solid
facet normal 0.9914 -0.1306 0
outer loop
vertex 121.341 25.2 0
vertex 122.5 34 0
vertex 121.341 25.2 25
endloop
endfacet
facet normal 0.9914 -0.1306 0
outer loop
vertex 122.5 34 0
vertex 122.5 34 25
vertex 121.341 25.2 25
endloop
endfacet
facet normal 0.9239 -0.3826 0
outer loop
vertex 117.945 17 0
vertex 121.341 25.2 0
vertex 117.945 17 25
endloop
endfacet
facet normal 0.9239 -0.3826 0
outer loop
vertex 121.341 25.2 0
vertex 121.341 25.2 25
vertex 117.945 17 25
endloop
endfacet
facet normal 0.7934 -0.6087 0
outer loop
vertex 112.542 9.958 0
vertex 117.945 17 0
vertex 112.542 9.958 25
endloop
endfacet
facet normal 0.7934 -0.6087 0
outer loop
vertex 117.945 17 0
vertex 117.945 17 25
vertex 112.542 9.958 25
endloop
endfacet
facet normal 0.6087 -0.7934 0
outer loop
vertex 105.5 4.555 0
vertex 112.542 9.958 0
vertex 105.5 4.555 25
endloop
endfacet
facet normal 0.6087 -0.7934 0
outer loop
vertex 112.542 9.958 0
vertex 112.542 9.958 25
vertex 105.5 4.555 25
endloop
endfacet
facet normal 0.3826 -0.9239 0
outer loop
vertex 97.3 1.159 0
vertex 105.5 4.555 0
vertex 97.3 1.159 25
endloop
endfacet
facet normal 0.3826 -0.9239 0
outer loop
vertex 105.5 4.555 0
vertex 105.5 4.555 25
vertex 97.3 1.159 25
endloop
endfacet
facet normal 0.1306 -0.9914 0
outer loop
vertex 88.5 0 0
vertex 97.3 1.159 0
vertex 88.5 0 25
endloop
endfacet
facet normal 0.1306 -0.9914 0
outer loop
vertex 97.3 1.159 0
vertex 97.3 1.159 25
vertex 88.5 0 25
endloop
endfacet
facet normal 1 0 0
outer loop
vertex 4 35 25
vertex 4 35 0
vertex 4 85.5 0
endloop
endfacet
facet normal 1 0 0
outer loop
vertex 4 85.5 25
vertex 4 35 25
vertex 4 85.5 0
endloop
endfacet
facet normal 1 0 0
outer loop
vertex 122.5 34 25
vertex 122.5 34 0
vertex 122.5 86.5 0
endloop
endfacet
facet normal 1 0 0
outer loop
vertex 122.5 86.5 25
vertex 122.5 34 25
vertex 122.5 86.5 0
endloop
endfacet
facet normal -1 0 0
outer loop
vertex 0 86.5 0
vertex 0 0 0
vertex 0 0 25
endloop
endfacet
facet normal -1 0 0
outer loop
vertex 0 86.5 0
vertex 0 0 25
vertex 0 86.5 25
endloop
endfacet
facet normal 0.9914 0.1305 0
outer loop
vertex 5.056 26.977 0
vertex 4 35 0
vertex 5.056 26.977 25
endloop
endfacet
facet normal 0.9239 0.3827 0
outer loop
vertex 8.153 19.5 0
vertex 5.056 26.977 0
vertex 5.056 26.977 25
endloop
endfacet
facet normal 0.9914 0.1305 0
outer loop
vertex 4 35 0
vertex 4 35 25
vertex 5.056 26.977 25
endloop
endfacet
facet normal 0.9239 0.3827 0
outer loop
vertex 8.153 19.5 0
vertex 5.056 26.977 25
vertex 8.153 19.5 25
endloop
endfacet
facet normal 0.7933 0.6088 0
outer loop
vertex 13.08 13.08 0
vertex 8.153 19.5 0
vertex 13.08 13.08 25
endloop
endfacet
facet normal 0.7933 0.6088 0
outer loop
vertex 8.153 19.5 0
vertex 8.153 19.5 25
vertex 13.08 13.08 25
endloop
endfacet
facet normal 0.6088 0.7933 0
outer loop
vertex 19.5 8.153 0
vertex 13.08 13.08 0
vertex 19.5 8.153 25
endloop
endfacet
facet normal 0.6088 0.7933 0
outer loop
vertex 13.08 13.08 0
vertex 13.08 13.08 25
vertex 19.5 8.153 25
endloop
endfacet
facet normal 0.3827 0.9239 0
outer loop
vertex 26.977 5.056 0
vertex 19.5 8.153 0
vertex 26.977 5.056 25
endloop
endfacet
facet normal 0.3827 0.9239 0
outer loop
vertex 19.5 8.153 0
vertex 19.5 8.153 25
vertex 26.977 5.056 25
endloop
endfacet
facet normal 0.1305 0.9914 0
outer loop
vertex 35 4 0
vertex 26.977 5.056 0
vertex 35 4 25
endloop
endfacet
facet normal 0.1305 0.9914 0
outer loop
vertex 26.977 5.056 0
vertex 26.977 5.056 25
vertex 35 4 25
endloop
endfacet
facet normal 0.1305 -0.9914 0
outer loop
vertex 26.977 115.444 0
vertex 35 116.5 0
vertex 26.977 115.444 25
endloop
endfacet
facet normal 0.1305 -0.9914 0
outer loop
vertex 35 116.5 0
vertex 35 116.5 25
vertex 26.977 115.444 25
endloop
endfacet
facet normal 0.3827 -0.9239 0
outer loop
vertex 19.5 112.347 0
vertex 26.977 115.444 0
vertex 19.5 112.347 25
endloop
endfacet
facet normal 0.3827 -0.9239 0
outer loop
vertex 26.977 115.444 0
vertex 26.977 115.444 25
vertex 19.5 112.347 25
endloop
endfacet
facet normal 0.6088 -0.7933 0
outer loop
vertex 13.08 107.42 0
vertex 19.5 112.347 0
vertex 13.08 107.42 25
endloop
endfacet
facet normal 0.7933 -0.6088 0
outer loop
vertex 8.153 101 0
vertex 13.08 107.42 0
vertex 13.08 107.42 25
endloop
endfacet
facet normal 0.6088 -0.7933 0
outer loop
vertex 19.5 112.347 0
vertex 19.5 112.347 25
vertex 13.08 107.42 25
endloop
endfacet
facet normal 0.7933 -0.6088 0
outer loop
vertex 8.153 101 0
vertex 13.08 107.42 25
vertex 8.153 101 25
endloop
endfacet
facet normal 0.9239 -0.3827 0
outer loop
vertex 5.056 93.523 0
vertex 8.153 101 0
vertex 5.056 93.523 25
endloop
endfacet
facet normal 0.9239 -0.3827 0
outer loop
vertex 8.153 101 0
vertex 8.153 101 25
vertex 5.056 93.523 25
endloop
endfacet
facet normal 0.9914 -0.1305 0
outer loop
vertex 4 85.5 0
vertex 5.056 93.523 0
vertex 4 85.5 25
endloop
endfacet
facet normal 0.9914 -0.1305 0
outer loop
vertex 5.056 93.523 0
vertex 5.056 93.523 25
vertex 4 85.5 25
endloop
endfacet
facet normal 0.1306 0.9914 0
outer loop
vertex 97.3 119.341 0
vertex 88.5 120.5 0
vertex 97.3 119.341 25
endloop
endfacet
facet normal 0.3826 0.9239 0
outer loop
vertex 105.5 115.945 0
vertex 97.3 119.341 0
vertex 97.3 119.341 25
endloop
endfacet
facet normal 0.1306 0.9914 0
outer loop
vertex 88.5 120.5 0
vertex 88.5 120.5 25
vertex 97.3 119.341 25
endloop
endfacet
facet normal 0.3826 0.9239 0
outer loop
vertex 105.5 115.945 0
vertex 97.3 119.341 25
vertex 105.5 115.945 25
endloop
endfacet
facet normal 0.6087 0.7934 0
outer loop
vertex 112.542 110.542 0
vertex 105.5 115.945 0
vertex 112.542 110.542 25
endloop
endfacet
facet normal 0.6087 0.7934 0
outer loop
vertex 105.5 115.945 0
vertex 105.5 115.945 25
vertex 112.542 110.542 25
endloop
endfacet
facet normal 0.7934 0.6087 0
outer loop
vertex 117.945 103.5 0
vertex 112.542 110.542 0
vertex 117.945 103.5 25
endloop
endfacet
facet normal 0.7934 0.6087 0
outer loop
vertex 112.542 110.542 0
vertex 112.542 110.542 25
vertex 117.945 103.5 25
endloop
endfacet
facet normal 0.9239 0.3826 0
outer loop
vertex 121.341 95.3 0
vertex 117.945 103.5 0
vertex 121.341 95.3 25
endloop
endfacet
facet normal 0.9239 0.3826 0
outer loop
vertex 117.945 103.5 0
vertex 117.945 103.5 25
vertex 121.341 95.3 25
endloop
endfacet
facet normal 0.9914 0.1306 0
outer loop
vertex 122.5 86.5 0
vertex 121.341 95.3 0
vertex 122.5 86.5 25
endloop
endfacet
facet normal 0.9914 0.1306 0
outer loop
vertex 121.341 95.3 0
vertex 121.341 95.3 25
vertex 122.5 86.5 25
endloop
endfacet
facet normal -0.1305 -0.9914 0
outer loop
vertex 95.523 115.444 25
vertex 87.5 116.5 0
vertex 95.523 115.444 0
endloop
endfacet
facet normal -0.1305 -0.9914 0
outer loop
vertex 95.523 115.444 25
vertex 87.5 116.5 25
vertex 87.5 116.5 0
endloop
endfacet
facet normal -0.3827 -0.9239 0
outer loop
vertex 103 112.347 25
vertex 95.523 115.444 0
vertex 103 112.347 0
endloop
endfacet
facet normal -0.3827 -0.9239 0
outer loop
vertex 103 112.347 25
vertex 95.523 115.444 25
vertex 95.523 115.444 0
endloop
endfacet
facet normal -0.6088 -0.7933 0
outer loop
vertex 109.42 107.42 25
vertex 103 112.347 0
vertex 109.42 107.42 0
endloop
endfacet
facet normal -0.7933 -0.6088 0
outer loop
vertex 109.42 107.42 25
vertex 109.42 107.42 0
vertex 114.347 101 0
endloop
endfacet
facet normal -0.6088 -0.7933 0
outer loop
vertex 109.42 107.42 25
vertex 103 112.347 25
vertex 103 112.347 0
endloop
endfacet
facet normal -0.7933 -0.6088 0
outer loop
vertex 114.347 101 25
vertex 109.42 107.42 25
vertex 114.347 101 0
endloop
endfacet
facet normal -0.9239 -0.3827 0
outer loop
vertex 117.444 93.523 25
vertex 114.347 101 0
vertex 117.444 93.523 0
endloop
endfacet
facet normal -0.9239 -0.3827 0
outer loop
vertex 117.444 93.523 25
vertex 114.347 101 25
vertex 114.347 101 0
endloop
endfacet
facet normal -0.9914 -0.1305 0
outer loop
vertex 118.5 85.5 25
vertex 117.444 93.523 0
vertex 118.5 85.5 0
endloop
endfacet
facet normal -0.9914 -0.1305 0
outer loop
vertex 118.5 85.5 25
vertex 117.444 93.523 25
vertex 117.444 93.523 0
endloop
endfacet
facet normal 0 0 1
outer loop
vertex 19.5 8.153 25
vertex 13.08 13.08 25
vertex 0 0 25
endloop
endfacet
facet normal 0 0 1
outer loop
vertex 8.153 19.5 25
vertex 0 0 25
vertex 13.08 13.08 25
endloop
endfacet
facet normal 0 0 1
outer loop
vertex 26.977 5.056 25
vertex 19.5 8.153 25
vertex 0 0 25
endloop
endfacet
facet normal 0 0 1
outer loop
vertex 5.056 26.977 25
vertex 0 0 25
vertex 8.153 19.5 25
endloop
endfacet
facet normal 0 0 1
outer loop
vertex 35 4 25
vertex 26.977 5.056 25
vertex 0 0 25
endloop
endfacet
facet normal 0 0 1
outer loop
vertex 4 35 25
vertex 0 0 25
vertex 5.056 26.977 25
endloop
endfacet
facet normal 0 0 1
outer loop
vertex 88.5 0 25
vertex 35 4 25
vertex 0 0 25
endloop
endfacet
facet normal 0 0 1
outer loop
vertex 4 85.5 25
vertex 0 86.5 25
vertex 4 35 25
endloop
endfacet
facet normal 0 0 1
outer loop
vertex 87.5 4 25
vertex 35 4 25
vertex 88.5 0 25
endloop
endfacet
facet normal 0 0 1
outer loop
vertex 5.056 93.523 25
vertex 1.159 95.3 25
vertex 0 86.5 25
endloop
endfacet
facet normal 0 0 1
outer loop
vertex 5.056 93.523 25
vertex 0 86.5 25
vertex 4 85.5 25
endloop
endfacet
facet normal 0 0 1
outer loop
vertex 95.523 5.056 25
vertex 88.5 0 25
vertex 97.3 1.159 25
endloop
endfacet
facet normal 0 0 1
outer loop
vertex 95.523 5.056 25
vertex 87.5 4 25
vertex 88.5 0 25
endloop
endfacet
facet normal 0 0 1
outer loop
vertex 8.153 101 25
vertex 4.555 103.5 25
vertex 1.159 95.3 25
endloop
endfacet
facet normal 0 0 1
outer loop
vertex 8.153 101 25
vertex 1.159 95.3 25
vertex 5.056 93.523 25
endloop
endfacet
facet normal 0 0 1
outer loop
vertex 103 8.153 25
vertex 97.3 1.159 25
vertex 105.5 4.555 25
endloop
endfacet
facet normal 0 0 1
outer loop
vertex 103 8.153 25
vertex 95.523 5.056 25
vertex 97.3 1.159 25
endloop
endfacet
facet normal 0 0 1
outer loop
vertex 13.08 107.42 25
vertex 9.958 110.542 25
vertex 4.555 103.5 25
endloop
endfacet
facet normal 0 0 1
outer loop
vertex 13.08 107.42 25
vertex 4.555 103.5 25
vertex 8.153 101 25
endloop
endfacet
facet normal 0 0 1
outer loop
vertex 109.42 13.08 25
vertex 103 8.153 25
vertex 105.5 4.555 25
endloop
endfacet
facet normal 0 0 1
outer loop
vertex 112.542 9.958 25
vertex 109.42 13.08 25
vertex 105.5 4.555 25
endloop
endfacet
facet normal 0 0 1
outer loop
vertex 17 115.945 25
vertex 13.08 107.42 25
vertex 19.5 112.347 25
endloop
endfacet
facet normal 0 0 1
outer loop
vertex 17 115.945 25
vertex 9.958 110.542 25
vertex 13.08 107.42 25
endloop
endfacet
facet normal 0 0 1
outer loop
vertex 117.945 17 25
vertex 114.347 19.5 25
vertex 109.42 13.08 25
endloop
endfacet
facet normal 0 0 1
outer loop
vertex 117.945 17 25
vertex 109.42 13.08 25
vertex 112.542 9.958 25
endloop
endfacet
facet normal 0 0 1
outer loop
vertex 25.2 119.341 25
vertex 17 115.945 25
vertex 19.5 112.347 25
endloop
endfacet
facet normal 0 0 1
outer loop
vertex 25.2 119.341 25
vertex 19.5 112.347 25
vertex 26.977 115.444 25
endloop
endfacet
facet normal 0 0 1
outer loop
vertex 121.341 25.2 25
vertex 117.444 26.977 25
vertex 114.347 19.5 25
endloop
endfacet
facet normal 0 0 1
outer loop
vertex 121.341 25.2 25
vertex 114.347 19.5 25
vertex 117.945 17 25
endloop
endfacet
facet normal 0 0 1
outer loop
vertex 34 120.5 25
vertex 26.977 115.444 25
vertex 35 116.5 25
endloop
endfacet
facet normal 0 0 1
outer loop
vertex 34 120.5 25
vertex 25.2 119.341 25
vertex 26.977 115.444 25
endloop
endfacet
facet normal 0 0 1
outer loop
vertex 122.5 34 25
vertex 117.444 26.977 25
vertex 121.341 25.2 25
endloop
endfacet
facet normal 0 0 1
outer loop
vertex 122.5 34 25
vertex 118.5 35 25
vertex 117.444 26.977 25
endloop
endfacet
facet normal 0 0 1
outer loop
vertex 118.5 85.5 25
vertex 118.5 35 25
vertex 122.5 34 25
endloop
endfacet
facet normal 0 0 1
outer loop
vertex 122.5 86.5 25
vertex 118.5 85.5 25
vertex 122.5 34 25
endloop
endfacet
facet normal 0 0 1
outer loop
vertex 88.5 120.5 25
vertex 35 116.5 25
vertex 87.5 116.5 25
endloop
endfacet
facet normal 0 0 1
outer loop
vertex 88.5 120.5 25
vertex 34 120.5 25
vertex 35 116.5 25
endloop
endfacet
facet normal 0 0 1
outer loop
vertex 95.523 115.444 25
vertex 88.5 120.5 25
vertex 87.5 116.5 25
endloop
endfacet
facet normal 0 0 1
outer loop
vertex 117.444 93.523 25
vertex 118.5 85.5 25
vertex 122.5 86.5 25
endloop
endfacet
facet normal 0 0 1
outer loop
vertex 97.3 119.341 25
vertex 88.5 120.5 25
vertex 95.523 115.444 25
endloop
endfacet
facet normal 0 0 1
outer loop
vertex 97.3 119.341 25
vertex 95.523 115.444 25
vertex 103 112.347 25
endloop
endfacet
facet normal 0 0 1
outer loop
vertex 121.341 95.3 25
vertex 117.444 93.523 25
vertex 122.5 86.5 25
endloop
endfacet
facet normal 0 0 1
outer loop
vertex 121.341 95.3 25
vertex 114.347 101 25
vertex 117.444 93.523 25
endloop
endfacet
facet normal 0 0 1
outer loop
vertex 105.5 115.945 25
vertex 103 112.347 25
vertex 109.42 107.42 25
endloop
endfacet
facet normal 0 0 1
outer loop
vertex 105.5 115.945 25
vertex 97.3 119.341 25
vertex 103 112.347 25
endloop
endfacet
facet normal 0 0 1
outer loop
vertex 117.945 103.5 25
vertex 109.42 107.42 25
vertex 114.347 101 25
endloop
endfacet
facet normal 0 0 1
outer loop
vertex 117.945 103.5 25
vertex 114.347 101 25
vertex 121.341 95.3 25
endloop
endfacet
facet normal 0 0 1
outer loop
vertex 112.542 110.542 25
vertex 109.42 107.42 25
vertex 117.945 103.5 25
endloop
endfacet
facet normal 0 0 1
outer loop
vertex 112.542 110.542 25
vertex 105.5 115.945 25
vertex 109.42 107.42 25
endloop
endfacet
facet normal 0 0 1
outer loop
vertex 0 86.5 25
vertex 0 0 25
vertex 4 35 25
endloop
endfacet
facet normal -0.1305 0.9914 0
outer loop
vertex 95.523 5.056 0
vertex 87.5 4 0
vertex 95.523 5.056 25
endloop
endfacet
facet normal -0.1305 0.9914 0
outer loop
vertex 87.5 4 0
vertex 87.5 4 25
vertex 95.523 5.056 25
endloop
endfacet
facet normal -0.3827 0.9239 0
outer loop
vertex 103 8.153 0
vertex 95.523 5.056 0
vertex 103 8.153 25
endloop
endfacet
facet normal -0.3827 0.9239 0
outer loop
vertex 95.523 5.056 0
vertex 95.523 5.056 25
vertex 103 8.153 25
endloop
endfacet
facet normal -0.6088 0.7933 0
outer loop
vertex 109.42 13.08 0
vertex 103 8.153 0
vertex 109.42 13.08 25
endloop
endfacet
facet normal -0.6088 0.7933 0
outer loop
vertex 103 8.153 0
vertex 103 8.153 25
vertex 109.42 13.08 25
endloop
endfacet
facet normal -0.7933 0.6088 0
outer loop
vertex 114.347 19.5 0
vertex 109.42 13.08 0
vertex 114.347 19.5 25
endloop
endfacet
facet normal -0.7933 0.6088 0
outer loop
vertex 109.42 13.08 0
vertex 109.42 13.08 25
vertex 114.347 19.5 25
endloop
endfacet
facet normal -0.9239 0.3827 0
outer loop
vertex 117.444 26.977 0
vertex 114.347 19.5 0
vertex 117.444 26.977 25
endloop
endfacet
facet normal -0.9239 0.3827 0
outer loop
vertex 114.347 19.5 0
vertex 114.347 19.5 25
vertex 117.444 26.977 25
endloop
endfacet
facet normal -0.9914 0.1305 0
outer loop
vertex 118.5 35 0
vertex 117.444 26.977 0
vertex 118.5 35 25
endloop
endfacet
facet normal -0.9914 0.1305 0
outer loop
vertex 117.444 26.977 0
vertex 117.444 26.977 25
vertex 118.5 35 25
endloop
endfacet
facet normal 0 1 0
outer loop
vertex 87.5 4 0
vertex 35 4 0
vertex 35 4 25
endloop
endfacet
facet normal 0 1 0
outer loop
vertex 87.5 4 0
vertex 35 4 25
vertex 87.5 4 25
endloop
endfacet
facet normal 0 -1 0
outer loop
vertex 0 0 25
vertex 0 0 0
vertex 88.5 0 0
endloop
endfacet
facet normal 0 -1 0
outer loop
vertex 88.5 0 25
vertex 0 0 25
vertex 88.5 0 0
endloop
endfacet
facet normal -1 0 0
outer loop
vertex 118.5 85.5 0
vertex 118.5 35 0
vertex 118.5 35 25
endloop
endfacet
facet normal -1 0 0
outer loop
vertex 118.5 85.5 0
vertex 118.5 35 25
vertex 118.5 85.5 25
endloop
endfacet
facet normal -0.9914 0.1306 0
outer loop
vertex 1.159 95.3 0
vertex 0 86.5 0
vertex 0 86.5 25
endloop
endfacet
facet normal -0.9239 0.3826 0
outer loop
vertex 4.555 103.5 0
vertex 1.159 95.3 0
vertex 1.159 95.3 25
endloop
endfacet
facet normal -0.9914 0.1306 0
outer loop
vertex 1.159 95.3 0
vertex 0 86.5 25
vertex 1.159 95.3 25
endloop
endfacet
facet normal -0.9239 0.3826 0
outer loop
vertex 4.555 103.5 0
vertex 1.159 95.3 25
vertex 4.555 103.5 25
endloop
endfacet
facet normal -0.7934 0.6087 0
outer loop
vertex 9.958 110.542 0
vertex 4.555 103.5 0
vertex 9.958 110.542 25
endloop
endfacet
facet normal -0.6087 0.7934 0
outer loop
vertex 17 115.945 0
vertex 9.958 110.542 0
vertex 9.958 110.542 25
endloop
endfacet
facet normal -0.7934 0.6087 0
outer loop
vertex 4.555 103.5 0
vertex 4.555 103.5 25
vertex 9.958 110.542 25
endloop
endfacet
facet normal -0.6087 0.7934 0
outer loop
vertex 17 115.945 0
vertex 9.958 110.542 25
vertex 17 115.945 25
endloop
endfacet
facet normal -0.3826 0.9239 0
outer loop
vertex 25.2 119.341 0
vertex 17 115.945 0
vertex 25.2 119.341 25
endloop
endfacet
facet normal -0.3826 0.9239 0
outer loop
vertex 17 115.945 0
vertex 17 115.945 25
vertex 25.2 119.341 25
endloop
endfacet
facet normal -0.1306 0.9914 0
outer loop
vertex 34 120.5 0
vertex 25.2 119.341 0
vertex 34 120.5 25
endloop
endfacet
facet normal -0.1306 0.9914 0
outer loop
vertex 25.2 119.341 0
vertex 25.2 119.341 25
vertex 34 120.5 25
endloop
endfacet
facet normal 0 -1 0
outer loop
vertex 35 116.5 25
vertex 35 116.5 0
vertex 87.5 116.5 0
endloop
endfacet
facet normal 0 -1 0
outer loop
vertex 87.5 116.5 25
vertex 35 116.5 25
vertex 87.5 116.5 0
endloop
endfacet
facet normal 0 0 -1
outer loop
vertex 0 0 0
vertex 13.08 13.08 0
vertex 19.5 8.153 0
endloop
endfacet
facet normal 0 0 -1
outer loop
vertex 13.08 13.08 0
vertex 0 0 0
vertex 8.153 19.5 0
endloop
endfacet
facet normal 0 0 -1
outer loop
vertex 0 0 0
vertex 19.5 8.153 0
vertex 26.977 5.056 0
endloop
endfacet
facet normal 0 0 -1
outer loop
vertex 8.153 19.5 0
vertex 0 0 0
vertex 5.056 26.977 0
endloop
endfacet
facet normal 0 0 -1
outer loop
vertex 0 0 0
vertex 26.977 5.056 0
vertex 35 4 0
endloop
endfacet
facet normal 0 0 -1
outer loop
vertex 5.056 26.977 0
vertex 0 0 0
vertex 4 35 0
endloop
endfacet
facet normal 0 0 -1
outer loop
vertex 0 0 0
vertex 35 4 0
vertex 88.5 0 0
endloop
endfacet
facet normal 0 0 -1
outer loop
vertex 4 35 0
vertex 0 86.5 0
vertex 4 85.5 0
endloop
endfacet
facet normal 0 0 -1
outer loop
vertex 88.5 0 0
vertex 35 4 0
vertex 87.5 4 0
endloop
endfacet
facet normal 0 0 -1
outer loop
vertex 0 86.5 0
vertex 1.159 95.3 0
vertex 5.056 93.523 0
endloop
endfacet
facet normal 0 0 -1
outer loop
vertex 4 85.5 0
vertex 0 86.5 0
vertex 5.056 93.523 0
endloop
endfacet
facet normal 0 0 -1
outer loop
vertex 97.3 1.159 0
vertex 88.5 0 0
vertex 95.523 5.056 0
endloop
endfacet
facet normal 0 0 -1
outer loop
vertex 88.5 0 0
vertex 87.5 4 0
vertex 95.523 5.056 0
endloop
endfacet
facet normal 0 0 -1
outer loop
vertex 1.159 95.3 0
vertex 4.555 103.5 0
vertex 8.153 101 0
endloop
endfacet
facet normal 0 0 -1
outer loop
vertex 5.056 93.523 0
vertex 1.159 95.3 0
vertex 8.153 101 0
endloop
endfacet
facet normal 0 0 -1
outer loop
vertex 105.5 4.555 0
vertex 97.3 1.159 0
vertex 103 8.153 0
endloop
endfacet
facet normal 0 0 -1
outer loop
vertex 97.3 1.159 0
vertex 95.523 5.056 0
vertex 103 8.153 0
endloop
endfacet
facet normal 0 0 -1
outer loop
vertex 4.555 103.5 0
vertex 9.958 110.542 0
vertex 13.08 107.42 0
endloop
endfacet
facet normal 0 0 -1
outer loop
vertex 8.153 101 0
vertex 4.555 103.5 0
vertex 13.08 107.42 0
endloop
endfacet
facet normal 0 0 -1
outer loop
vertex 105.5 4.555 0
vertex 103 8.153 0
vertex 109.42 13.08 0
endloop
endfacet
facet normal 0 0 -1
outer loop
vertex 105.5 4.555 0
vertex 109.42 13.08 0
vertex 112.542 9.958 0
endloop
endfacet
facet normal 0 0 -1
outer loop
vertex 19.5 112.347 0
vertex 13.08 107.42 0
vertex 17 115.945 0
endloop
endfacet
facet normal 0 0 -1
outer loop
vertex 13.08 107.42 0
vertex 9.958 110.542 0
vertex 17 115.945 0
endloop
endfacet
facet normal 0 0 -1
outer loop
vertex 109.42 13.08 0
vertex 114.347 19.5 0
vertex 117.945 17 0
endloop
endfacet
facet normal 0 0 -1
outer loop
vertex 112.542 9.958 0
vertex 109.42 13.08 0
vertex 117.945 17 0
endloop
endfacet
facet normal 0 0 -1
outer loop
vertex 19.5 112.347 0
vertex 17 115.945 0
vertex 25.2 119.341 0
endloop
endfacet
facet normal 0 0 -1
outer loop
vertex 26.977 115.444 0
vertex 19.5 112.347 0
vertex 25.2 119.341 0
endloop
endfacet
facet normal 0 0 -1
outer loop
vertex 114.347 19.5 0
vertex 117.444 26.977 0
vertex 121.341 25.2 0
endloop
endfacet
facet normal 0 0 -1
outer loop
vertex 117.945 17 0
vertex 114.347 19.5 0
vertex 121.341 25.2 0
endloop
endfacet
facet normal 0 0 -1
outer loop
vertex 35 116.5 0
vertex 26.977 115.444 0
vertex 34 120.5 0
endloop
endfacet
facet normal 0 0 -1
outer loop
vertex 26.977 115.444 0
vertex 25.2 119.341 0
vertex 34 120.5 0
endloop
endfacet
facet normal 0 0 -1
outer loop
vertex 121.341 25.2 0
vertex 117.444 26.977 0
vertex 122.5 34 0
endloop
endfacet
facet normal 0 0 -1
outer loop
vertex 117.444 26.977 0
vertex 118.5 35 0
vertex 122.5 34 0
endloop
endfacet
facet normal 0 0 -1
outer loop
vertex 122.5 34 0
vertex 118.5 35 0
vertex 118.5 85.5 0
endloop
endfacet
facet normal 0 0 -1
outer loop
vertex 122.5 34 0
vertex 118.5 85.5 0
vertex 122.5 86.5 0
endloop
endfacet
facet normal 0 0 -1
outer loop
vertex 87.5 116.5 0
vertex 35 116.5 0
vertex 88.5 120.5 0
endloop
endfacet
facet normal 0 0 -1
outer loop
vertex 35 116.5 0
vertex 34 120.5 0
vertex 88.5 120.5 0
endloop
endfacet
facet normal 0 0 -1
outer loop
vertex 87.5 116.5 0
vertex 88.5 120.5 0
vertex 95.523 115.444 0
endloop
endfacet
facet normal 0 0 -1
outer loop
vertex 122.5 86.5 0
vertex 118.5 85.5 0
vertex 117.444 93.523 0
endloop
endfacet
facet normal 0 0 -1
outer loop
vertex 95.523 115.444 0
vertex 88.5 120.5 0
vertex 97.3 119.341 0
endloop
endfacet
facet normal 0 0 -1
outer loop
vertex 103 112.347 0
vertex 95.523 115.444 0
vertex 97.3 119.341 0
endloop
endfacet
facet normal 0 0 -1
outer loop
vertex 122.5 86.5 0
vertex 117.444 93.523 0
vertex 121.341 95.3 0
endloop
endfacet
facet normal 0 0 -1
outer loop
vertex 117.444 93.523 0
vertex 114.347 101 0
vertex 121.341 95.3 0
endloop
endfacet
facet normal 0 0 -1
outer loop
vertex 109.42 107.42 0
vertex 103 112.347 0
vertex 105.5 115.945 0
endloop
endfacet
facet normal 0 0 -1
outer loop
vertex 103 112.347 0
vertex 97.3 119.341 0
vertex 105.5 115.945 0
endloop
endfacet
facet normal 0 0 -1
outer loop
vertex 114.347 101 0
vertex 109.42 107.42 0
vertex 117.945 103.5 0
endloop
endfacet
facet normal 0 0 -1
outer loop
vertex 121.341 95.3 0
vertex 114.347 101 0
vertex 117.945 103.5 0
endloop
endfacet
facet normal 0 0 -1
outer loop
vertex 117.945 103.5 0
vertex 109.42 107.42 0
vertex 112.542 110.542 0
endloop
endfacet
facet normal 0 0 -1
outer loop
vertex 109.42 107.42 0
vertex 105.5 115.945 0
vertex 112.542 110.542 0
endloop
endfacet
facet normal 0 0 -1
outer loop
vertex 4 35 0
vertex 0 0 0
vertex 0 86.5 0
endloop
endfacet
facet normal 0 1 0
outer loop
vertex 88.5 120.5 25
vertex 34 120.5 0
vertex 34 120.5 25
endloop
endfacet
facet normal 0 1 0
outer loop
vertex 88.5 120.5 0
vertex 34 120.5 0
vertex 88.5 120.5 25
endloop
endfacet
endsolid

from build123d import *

# Parameters (mm, degrees)
BOX001_W     = 114.5
BOX001_H     = 112.5
BOX001_DEPTH = 32
BOX_W        = 122.5
BOX_H        = 120.5
BOX_DEPTH    = 25
FILLET_R     = 31
FILLET001_R  = 31
FILLET002_R  = 31
FILLET003_R  = 31
FILLET004_R  = 34
FILLET005_R  = 34
FILLET006_R  = 34


with BuildPart() as cubo001:
    # Box001 → Box001 (new body)
    with BuildSketch(Plane(origin=(4, 4, 0), x_dir=(1, 0, 0), z_dir=(0, 0, 1))):
        with Locations((57.25, 56.25)):
            Rectangle(BOX001_W, BOX001_H)
    extrude(amount=BOX001_DEPTH)


with BuildPart() as fillet006:
    # Box → Box (new body)
    with BuildSketch(Plane.XY):
        with Locations((61.25, 60.25)):
            Rectangle(BOX_W, BOX_H)
    extrude(amount=BOX_DEPTH)

    # Cut: cut Cubo001
    add(cubo001.part, mode=Mode.SUBTRACT)

    # Fillet
    fillet_edges = [fillet006.edges().sort_by_distance(p)[0] for p in [
        (4, 116.5, 12.5),
    ]]
    fillet(fillet_edges, radius=FILLET_R)

    # Fillet001
    fillet001_edges = [fillet006.edges().sort_by_distance(p)[0] for p in [
        (118.5, 116.5, 12.5),
    ]]
    fillet(fillet001_edges, radius=FILLET001_R)

    # Fillet002
    fillet002_edges = [fillet006.edges().sort_by_distance(p)[0] for p in [
        (4, 4, 12.5),
    ]]
    fillet(fillet002_edges, radius=FILLET002_R)

    # Fillet003
    fillet003_edges = [fillet006.edges().sort_by_distance(p)[0] for p in [
        (118.5, 4, 12.5),
    ]]
    fillet(fillet003_edges, radius=FILLET003_R)

    # Fillet004
    fillet004_edges = [fillet006.edges().sort_by_distance(p)[0] for p in [
        (0, 120.5, 12.5),
    ]]
    fillet(fillet004_edges, radius=FILLET004_R)

    # Fillet005
    fillet005_edges = [fillet006.edges().sort_by_distance(p)[0] for p in [
        (122.5, 120.5, 12.5),
    ]]
    fillet(fillet005_edges, radius=FILLET005_R)

    # Fillet006
    fillet006_edges = [fillet006.edges().sort_by_distance(p)[0] for p in [
        (122.5, 0, 12.5),
    ]]
    fillet(fillet006_edges, radius=FILLET006_R)


solid = fillet006.part
